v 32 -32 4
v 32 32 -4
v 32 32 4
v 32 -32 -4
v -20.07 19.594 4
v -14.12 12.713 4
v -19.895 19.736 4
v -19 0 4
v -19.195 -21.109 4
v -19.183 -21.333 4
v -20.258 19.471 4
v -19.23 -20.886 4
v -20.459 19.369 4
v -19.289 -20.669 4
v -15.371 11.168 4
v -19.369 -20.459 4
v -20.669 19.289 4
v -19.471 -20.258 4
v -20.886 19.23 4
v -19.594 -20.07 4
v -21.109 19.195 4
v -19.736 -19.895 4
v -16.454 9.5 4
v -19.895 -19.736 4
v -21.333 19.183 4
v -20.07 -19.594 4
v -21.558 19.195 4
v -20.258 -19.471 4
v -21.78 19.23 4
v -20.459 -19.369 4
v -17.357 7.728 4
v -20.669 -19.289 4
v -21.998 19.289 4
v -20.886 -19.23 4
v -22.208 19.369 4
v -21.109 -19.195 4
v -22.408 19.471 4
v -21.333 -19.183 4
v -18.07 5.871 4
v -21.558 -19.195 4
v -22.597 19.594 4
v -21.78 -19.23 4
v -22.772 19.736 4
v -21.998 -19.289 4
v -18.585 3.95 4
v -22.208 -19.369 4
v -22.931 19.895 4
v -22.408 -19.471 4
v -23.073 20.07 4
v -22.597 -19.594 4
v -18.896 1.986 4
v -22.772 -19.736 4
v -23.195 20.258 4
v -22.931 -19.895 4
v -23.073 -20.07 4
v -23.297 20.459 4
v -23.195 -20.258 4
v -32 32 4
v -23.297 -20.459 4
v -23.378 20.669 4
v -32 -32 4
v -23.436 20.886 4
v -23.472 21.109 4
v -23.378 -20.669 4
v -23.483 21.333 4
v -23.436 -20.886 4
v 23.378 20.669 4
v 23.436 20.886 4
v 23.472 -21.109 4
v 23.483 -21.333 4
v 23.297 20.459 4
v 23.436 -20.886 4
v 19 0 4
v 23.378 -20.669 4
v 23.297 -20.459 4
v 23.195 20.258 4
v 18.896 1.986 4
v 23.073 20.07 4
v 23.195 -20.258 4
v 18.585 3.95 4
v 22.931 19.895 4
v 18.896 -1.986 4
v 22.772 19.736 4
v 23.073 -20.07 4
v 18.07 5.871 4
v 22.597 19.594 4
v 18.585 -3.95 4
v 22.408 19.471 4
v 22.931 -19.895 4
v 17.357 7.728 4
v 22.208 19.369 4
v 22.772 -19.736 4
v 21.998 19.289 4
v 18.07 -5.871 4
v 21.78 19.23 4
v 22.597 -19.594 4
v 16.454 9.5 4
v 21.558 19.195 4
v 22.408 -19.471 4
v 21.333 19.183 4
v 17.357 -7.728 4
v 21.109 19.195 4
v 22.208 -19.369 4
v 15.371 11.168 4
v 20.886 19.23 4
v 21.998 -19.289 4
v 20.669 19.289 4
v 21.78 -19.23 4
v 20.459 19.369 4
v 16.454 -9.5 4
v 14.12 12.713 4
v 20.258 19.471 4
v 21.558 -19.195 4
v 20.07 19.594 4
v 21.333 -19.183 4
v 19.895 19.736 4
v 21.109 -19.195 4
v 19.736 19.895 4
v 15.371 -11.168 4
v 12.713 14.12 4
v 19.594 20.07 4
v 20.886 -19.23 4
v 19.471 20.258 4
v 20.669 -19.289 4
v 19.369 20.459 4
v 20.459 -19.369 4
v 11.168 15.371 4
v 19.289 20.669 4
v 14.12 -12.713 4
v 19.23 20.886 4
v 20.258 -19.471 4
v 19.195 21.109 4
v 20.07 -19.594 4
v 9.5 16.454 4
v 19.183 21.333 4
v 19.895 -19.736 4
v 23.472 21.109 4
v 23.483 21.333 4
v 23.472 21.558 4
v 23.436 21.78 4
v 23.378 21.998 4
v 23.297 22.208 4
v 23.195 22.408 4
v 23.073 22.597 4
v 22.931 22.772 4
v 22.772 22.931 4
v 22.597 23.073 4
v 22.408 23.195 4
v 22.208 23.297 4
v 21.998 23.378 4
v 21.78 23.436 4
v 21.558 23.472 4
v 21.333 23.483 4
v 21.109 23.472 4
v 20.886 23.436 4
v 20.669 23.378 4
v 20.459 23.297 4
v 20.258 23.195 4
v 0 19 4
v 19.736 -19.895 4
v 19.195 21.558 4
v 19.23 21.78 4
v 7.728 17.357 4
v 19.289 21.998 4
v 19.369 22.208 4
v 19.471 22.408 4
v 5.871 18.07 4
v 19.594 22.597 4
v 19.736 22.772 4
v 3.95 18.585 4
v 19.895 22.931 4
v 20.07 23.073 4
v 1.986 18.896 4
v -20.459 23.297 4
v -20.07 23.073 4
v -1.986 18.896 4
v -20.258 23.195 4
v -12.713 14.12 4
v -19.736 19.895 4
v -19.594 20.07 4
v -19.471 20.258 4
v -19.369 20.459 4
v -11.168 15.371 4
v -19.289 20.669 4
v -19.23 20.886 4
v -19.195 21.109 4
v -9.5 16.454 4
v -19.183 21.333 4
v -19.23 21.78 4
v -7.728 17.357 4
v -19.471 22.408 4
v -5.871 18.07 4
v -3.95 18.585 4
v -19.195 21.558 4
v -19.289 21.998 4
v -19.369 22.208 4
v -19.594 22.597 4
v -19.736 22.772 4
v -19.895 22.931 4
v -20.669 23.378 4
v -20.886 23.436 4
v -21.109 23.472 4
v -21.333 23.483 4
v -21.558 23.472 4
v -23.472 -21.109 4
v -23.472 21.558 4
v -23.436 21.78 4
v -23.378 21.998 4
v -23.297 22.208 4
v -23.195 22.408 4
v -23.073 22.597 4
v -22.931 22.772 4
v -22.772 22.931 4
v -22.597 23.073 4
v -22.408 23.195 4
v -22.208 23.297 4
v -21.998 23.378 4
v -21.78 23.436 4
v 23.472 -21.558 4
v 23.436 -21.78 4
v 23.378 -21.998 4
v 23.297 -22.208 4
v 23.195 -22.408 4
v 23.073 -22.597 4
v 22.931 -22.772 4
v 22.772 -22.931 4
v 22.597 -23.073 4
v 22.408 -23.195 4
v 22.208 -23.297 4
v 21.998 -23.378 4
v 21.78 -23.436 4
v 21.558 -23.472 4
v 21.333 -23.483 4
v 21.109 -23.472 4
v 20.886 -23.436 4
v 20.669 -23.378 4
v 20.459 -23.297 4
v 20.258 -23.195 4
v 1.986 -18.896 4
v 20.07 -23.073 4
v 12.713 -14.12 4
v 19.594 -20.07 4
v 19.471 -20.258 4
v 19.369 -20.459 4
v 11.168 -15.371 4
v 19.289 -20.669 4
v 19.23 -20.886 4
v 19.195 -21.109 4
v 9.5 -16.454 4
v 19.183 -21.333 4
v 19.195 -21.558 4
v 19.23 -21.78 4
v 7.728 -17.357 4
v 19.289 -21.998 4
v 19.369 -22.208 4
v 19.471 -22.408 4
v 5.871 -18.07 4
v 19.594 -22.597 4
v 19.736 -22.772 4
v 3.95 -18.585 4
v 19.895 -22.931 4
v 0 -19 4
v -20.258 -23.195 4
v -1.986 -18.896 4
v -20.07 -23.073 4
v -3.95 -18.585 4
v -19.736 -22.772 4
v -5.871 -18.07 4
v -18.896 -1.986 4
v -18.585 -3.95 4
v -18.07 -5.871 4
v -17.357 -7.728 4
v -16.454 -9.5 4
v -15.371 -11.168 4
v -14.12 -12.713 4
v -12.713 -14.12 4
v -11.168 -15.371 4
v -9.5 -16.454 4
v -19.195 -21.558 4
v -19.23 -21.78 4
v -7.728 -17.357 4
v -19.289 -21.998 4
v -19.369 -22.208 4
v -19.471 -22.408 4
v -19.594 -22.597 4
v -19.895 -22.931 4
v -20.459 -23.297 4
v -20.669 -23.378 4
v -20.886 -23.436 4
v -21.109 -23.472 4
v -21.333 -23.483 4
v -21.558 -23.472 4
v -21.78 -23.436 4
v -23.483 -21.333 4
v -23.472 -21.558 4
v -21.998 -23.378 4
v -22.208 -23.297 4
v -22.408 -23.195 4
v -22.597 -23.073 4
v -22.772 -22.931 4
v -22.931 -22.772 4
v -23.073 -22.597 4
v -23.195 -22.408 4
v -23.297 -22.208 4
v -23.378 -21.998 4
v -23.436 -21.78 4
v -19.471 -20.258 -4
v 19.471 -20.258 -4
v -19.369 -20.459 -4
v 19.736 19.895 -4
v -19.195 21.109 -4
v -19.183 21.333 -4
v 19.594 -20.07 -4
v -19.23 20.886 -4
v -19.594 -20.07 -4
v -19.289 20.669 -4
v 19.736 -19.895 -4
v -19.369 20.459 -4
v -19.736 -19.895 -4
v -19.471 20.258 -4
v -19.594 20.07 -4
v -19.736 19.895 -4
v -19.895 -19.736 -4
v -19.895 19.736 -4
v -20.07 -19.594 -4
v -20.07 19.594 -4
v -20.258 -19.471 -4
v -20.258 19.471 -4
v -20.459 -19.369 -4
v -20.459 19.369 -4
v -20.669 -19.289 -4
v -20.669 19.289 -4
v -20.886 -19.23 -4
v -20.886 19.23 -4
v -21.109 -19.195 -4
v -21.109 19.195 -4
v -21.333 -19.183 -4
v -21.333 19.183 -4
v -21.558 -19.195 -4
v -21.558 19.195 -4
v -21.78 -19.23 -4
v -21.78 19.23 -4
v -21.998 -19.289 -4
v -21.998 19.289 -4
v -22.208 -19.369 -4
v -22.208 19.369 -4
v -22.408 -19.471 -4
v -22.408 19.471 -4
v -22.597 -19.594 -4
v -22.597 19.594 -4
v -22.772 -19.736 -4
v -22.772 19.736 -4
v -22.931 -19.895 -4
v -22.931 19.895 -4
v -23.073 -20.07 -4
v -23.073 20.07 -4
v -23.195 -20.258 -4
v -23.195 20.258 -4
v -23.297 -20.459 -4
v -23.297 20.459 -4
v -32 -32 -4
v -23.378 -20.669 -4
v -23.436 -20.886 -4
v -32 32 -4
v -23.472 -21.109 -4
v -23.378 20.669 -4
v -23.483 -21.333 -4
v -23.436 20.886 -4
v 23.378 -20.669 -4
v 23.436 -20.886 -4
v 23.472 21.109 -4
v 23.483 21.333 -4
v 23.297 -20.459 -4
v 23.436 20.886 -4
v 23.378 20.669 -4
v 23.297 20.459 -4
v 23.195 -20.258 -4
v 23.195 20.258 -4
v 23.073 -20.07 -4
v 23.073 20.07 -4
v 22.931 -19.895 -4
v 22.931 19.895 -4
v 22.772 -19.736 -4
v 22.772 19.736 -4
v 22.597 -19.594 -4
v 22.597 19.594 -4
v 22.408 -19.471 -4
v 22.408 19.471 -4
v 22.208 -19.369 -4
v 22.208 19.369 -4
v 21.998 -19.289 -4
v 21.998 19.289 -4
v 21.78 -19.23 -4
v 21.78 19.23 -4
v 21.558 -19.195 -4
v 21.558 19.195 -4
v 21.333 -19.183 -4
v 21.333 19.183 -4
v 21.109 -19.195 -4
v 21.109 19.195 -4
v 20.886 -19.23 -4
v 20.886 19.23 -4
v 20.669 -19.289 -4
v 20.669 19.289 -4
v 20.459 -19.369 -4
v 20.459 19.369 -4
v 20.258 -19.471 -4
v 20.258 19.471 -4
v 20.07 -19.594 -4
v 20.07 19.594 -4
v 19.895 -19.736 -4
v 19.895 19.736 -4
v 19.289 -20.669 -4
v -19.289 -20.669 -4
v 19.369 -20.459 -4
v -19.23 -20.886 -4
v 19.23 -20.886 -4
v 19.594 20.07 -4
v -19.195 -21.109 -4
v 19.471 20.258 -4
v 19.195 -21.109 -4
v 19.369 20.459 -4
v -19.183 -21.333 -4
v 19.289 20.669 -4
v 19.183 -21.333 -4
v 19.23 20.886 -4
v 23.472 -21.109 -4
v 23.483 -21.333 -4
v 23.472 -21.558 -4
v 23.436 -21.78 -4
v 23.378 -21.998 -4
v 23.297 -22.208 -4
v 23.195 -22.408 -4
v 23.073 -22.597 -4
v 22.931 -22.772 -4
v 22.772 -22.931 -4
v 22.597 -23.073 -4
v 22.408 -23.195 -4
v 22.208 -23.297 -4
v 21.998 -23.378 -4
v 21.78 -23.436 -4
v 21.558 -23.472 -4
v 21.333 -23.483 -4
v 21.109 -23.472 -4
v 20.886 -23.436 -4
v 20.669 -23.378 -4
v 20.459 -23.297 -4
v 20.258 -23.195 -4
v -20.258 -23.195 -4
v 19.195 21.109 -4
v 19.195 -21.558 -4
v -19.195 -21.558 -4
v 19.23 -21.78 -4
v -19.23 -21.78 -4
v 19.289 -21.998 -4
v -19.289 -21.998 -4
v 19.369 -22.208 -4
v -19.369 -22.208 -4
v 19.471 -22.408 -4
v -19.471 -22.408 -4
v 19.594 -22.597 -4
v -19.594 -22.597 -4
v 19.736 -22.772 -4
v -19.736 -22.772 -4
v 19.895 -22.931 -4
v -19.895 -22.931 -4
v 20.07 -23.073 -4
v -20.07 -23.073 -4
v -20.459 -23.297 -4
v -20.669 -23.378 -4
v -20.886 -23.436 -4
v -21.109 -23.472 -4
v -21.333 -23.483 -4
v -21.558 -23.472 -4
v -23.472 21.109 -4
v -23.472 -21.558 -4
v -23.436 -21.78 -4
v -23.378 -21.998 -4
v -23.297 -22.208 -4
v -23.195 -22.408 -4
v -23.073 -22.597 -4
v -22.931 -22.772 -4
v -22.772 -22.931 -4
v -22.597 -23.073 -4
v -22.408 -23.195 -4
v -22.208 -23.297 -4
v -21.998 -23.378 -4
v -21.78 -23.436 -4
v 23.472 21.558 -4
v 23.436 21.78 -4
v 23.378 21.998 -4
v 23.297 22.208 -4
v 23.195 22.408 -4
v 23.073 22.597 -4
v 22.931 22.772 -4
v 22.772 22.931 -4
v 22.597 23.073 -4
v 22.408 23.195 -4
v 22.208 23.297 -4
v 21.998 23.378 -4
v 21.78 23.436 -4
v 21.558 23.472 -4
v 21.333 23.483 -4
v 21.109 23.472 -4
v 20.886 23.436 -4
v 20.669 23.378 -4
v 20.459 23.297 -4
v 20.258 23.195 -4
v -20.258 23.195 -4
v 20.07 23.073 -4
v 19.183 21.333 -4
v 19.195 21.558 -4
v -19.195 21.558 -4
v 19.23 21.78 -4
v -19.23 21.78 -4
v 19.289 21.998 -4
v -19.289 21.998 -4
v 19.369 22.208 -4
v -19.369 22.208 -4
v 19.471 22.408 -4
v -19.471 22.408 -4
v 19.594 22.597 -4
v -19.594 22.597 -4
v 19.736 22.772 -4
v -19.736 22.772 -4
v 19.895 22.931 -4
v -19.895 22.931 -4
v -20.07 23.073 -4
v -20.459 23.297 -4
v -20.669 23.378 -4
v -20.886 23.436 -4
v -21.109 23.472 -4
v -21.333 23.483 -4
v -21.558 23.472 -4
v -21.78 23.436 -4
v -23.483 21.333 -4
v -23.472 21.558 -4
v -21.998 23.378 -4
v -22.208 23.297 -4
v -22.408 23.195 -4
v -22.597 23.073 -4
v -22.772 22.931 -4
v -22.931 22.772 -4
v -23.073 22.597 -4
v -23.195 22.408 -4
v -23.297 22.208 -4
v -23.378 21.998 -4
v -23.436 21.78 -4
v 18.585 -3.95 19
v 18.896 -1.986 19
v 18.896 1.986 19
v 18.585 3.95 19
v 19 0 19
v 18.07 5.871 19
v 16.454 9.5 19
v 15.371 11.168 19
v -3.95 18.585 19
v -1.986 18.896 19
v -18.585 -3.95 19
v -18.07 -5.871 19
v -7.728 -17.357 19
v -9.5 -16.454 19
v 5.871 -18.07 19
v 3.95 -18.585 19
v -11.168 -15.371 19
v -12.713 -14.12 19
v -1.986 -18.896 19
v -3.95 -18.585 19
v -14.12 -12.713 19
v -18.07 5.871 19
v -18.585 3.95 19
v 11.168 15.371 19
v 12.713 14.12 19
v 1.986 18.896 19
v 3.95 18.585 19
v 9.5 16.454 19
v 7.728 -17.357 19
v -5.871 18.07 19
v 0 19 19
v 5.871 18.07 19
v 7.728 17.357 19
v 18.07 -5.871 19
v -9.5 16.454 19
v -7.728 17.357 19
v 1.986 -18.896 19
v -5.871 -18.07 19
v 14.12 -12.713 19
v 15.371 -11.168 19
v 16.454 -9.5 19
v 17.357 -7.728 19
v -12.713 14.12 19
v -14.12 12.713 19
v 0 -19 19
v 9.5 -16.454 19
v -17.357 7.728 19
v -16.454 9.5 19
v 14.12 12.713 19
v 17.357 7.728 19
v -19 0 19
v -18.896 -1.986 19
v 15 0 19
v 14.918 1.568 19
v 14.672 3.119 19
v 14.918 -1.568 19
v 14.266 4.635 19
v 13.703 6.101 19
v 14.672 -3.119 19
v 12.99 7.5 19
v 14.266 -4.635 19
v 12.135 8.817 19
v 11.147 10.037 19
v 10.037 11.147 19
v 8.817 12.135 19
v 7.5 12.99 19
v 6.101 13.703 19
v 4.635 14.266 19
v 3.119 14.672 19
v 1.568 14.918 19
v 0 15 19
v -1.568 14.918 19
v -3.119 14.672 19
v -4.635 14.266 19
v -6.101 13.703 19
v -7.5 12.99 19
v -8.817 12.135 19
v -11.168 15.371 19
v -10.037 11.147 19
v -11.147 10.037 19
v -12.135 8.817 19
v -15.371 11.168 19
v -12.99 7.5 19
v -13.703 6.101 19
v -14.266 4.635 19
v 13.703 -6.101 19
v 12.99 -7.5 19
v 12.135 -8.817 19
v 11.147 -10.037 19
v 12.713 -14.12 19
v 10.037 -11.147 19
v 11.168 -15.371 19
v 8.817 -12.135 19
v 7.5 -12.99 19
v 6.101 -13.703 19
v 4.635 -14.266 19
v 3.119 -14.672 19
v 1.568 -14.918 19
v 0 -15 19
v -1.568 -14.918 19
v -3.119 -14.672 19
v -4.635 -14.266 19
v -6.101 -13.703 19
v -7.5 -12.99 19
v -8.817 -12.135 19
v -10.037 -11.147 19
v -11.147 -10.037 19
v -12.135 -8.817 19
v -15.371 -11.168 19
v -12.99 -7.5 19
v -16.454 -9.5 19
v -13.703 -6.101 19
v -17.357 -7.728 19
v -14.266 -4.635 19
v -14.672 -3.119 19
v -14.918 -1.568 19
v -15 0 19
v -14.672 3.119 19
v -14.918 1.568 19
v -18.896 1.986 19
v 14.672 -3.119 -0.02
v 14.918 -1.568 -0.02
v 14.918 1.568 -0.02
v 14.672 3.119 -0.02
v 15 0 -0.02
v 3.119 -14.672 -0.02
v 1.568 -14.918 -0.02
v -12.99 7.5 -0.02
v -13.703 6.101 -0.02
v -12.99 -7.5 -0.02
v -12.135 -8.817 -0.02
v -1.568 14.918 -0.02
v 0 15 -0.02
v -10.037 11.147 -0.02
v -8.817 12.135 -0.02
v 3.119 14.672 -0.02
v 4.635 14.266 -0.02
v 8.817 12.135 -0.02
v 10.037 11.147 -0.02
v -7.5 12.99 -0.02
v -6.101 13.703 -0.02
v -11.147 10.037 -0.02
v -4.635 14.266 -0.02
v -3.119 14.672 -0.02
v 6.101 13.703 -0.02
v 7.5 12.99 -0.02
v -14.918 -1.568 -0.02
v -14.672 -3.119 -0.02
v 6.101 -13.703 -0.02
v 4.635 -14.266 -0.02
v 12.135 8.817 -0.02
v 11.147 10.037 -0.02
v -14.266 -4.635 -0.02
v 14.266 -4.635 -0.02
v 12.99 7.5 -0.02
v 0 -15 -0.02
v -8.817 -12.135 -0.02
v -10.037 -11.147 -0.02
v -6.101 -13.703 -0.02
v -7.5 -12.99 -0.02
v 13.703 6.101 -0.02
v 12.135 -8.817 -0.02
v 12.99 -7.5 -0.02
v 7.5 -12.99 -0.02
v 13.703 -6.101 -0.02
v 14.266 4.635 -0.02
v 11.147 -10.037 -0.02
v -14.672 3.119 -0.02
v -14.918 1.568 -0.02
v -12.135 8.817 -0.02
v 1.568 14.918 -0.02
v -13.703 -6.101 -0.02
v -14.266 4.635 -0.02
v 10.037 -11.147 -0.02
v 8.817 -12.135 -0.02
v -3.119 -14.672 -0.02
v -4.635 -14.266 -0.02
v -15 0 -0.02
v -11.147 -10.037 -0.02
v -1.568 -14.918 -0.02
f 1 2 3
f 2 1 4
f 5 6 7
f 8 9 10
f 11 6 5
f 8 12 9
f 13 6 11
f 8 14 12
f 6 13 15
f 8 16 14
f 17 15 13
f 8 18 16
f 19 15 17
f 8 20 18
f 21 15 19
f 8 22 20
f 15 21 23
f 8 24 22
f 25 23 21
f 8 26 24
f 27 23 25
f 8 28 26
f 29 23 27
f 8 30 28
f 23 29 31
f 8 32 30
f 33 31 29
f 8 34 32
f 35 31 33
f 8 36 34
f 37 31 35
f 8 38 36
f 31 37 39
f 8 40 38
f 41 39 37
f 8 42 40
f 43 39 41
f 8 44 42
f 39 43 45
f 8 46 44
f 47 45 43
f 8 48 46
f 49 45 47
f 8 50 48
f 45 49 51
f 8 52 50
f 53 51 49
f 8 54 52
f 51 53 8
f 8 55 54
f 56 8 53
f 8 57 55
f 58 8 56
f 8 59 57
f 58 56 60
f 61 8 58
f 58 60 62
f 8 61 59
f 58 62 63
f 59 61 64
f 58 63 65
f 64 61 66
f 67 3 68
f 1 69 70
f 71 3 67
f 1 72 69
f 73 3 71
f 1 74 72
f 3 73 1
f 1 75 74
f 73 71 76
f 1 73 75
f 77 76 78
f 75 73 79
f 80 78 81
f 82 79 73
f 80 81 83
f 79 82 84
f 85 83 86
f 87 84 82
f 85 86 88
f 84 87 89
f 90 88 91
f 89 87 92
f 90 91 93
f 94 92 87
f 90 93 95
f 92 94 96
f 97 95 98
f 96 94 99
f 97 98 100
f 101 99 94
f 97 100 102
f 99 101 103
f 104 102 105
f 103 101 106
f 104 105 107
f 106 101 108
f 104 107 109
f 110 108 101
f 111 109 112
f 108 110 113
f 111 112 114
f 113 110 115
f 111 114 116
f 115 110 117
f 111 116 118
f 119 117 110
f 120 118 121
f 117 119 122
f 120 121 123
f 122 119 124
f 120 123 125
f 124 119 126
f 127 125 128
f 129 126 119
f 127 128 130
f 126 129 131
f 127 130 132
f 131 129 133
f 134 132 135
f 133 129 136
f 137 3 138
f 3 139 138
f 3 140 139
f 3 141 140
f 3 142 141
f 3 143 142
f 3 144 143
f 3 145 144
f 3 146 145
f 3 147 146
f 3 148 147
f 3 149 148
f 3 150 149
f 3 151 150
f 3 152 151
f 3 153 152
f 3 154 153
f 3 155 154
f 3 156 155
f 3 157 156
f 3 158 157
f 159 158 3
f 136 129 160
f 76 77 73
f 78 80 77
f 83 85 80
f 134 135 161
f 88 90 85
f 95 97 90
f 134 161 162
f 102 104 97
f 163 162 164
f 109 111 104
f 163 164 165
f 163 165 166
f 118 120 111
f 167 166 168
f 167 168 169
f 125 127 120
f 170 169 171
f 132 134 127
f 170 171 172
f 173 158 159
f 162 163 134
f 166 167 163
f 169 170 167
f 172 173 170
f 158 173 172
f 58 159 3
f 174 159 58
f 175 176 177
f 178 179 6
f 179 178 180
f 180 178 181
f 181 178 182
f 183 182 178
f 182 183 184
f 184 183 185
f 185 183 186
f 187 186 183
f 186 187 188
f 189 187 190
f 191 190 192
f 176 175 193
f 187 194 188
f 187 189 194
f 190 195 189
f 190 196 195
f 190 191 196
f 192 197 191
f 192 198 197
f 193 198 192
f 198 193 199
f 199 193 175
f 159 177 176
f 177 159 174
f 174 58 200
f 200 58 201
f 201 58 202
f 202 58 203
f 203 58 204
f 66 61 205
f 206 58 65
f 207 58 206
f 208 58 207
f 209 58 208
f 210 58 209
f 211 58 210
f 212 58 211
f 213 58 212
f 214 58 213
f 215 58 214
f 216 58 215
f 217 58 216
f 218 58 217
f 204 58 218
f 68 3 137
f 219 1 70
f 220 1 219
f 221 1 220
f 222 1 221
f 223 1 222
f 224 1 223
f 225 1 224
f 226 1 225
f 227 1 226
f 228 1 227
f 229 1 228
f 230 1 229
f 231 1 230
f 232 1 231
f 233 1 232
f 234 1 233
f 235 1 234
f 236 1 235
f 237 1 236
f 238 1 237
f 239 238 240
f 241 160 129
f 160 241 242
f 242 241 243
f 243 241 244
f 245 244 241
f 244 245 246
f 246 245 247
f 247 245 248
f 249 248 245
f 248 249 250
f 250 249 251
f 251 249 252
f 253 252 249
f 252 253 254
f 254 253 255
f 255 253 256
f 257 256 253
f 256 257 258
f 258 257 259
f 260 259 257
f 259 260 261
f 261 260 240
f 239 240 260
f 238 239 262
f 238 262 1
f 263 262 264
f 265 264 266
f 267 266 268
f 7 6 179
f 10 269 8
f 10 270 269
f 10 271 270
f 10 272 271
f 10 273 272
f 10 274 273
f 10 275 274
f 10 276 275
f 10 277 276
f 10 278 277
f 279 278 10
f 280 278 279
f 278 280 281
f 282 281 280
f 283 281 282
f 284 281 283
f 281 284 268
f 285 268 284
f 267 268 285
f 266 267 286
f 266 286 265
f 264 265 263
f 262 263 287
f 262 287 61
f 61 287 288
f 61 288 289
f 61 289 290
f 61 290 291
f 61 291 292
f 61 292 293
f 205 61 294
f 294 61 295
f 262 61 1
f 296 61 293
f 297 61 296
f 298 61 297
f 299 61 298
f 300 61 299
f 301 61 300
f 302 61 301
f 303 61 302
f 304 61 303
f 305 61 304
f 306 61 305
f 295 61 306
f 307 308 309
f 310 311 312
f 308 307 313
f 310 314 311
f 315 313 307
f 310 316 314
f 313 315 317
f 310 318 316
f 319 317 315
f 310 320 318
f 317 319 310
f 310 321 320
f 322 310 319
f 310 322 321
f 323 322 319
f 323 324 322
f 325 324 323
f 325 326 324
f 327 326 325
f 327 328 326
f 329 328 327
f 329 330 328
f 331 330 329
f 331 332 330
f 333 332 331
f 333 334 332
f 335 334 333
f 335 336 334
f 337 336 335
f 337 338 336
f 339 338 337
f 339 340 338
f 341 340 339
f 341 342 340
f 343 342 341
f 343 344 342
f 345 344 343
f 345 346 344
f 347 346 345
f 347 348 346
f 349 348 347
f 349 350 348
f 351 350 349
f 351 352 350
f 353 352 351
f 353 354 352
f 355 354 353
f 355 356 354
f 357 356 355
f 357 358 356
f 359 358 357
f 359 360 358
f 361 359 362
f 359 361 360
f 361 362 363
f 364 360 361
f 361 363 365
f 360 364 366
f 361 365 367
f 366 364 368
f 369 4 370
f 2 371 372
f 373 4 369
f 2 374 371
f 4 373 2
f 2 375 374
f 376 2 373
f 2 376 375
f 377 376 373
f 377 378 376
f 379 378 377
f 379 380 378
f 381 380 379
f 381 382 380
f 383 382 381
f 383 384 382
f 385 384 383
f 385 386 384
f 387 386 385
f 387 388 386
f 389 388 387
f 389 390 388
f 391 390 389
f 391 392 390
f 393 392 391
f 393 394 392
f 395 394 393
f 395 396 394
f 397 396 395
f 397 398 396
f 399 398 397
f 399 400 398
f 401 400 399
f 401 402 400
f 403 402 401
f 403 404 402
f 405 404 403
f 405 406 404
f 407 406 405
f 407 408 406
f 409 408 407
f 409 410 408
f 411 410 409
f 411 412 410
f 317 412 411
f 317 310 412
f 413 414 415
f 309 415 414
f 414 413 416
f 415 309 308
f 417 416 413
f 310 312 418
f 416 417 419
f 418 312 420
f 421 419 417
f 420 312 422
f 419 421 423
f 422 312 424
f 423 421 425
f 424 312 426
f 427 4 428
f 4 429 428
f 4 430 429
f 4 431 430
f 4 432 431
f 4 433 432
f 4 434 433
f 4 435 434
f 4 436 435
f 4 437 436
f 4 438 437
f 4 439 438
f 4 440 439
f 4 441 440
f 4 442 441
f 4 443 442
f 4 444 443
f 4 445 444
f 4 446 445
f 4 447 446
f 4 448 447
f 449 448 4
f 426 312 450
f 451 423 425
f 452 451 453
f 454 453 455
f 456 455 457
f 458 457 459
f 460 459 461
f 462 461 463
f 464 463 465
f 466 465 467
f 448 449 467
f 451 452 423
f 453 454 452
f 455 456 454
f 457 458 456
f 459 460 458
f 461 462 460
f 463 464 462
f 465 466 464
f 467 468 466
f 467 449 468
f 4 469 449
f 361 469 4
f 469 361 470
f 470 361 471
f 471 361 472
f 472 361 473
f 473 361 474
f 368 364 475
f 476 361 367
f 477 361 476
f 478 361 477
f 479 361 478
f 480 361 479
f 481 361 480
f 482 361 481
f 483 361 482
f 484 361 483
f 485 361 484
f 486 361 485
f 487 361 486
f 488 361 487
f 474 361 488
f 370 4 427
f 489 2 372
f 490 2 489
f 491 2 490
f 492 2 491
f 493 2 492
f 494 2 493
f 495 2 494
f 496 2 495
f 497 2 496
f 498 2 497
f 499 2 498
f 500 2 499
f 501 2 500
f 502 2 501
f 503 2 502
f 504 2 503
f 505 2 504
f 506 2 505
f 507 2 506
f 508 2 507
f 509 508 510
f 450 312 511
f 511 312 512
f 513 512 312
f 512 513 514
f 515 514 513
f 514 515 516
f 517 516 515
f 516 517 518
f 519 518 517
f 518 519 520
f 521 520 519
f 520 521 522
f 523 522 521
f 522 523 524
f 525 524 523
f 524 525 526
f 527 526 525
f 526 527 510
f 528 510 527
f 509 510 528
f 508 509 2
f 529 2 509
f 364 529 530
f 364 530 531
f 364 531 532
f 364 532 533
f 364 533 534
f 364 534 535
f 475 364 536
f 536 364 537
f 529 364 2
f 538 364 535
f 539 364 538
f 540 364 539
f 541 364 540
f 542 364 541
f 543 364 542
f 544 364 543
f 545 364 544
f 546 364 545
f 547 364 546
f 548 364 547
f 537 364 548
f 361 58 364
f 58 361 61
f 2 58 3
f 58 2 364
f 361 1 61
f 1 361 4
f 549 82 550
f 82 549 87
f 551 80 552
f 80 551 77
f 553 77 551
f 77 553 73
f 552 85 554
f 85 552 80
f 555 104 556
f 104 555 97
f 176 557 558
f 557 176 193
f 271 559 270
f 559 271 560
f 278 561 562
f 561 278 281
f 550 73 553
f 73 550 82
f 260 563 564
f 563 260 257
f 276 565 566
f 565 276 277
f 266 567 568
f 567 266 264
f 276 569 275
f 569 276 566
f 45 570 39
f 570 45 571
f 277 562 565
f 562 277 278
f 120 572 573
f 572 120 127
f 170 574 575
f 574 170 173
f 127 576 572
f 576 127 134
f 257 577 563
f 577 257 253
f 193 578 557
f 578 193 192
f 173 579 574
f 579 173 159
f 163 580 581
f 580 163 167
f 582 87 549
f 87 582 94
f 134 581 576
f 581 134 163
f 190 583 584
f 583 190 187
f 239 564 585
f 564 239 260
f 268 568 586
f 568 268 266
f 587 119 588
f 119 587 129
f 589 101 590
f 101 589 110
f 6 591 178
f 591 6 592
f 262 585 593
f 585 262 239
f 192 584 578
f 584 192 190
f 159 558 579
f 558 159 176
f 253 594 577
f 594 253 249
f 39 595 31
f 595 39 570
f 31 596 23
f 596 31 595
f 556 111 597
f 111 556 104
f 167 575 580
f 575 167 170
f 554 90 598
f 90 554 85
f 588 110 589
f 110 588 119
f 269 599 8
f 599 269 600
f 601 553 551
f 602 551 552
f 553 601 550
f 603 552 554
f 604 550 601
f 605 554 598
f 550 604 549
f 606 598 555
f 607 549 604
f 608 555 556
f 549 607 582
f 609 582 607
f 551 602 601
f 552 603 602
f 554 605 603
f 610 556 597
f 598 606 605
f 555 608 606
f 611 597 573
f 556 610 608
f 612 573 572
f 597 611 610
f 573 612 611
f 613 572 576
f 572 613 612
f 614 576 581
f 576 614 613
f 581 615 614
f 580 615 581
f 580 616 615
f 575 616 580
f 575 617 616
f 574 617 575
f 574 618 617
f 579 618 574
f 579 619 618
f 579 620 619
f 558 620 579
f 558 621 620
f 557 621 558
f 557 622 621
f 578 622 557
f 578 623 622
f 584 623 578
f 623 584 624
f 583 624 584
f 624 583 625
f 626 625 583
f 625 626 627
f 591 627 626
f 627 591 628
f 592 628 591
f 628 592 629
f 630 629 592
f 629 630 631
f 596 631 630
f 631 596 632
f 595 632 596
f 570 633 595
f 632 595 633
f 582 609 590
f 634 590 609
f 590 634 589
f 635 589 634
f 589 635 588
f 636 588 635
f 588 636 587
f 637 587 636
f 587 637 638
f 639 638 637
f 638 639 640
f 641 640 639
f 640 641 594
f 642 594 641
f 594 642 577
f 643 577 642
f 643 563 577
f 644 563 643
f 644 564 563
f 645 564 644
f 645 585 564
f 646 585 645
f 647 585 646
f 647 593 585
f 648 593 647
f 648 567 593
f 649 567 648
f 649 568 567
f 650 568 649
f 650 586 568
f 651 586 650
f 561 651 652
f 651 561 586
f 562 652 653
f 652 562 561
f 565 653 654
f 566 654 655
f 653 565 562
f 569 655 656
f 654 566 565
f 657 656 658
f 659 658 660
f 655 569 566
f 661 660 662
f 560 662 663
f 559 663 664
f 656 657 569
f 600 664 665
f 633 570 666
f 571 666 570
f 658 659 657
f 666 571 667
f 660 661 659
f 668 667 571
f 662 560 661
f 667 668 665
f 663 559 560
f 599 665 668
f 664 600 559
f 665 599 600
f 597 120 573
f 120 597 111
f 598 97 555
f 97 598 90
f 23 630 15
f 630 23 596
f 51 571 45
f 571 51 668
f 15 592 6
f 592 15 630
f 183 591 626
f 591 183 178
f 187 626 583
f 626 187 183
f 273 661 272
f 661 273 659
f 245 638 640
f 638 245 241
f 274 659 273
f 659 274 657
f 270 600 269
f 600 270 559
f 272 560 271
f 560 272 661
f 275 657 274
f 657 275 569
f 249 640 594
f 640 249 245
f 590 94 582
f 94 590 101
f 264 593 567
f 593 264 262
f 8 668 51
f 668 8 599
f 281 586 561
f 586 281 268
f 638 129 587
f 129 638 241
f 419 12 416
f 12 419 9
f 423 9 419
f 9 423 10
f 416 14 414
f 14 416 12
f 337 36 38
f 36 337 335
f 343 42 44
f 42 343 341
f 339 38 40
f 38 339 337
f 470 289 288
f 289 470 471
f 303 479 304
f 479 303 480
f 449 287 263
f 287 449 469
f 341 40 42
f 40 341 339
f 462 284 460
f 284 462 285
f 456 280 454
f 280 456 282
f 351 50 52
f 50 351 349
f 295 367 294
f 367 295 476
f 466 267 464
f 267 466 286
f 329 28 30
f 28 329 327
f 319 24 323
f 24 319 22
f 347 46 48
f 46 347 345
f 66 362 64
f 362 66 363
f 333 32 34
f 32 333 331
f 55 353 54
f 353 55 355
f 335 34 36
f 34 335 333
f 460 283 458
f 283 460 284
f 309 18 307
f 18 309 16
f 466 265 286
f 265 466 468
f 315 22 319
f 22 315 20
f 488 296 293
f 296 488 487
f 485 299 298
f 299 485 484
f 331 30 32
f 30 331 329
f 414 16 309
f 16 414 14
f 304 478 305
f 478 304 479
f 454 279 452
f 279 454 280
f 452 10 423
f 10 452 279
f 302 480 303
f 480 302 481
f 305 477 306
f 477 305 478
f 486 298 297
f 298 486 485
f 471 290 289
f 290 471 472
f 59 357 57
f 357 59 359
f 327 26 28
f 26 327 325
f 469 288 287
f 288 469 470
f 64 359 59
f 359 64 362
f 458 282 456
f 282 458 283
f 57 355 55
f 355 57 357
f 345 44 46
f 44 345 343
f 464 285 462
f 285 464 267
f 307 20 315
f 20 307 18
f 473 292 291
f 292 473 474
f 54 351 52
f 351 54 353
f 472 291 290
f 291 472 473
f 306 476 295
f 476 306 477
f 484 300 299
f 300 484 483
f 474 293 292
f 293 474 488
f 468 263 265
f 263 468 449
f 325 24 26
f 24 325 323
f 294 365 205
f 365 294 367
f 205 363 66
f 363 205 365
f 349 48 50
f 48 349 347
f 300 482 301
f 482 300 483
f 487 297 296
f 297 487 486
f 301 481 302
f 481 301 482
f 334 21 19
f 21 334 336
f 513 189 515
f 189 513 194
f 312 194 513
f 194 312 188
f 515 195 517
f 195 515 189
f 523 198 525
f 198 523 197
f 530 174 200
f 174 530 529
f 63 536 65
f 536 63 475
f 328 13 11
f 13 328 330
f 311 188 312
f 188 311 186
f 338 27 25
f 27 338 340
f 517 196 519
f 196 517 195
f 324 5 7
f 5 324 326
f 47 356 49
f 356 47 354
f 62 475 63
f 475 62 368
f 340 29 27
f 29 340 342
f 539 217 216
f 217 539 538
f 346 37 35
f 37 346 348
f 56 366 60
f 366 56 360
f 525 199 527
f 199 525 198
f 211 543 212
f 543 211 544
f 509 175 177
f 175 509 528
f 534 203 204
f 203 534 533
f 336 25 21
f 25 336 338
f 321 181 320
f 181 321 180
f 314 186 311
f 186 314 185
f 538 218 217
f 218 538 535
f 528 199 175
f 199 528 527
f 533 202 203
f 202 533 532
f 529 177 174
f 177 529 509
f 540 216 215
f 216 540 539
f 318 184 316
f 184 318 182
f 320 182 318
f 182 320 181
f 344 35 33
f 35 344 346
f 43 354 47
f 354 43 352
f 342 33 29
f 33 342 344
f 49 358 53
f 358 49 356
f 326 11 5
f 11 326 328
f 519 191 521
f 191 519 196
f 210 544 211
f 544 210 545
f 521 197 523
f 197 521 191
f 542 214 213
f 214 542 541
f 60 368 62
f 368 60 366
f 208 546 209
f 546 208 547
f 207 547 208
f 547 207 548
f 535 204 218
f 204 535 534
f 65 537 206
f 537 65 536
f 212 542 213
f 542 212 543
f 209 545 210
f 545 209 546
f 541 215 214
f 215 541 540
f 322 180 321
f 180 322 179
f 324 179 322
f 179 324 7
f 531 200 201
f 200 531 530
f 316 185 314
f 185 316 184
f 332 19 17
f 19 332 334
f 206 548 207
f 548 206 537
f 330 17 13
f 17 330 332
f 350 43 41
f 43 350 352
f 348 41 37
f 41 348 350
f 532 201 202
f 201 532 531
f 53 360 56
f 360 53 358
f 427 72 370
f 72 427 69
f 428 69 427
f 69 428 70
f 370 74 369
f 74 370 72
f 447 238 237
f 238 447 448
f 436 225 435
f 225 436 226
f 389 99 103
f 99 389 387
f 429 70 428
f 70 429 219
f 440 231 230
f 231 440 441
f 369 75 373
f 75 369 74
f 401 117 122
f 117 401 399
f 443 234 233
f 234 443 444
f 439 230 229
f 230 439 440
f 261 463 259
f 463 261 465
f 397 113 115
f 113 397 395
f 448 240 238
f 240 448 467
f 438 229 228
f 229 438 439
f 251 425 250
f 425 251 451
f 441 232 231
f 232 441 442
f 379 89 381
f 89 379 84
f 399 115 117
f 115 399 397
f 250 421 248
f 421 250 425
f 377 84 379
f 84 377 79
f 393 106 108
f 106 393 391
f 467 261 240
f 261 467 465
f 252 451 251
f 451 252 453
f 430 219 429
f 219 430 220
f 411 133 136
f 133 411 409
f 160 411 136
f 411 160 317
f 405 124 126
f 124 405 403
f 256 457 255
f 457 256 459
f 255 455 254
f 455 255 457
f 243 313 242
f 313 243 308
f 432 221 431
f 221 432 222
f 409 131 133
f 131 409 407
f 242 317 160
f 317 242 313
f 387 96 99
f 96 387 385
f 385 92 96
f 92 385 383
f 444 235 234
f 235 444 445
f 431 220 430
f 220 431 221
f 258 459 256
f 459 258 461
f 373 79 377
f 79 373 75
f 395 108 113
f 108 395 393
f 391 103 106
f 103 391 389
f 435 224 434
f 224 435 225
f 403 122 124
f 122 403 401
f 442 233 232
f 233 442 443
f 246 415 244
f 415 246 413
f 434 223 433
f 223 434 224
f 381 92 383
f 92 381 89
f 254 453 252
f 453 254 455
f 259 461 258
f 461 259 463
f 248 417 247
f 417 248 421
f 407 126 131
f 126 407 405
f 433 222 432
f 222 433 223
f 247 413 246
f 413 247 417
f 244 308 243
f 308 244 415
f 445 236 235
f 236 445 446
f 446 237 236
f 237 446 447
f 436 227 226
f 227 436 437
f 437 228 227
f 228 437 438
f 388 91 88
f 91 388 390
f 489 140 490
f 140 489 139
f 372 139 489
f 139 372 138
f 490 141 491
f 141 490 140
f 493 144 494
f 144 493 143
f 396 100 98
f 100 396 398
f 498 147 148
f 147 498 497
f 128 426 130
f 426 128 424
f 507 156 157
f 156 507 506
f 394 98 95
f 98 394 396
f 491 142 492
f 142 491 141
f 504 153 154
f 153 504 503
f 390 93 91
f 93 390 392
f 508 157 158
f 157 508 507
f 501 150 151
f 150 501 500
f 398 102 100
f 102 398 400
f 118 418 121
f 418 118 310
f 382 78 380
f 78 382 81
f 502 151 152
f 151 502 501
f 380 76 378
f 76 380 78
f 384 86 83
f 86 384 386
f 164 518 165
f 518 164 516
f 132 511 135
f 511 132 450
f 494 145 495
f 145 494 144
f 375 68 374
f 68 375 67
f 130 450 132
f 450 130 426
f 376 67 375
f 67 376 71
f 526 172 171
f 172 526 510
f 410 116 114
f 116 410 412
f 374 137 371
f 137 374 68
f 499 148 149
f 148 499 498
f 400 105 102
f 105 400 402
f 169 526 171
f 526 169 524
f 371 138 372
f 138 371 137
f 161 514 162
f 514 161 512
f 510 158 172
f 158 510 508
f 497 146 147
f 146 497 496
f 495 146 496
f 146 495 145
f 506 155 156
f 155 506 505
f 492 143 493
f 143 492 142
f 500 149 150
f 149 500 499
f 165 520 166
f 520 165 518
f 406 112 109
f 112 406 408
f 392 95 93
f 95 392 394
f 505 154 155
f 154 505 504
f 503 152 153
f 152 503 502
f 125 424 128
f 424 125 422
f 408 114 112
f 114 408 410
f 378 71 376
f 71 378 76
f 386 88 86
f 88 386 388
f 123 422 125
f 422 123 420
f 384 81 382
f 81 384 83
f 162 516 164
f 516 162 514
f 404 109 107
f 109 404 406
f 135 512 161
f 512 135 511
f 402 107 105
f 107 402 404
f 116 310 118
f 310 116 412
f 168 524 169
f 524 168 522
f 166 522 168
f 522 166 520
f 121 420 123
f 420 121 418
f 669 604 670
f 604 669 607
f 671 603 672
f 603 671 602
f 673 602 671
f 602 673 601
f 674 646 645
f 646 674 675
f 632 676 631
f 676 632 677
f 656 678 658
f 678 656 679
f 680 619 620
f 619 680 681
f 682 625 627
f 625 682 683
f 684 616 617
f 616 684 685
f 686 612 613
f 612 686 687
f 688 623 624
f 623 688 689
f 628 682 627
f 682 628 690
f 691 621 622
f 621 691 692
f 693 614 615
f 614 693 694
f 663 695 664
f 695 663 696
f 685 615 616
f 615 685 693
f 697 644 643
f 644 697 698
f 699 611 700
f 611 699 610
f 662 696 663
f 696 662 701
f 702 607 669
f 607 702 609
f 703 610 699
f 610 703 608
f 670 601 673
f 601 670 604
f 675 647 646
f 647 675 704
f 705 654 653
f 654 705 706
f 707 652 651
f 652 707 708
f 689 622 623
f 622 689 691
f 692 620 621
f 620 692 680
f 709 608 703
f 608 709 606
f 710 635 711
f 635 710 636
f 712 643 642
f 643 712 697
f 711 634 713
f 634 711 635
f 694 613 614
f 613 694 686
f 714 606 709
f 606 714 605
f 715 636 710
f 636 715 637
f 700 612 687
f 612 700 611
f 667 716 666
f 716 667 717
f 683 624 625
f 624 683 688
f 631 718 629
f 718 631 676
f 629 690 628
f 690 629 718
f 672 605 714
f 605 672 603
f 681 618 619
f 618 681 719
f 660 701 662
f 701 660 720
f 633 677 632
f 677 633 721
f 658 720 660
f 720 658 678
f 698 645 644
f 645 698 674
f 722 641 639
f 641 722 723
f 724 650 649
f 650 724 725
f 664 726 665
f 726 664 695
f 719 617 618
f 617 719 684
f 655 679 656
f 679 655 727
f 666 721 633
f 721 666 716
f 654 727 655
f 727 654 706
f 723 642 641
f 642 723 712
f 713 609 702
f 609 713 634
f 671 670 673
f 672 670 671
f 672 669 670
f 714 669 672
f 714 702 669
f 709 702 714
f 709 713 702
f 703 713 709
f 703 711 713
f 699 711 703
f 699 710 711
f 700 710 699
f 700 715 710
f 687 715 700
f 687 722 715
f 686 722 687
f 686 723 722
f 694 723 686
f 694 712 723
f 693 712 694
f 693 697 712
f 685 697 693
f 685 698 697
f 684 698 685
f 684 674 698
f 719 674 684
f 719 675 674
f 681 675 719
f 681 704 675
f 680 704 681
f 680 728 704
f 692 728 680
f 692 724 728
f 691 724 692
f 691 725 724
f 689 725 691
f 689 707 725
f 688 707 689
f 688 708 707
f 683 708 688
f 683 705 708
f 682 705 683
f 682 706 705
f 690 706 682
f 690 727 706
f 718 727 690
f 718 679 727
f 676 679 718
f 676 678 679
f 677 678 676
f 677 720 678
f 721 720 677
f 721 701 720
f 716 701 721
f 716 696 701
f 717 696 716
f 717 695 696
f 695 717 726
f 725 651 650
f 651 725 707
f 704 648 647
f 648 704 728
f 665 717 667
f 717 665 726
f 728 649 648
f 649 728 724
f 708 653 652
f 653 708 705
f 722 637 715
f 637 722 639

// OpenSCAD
// Flange bearing block for 30 mm bearing OD.
$fn = 60;
eps = 0.02;
bearing_d = 30;
plate_l = bearing_d + 34;
plate_t = 8;
hub_h = bearing_d / 2 + 4;
difference() {
    union() {
        cube([plate_l, plate_l, plate_t], center = true);
        cylinder(d = bearing_d + 8, h = hub_h);
    }
    translate([0, 0, -eps]) cylinder(d = bearing_d, h = hub_h + 2 * eps);
    for (x = [-plate_l / 3, plate_l / 3], y = [-plate_l / 3, plate_l / 3])
        translate([x, y, -plate_t / 2 - eps]) cylinder(d = 4.3, h = plate_t + 2 * eps);
}
